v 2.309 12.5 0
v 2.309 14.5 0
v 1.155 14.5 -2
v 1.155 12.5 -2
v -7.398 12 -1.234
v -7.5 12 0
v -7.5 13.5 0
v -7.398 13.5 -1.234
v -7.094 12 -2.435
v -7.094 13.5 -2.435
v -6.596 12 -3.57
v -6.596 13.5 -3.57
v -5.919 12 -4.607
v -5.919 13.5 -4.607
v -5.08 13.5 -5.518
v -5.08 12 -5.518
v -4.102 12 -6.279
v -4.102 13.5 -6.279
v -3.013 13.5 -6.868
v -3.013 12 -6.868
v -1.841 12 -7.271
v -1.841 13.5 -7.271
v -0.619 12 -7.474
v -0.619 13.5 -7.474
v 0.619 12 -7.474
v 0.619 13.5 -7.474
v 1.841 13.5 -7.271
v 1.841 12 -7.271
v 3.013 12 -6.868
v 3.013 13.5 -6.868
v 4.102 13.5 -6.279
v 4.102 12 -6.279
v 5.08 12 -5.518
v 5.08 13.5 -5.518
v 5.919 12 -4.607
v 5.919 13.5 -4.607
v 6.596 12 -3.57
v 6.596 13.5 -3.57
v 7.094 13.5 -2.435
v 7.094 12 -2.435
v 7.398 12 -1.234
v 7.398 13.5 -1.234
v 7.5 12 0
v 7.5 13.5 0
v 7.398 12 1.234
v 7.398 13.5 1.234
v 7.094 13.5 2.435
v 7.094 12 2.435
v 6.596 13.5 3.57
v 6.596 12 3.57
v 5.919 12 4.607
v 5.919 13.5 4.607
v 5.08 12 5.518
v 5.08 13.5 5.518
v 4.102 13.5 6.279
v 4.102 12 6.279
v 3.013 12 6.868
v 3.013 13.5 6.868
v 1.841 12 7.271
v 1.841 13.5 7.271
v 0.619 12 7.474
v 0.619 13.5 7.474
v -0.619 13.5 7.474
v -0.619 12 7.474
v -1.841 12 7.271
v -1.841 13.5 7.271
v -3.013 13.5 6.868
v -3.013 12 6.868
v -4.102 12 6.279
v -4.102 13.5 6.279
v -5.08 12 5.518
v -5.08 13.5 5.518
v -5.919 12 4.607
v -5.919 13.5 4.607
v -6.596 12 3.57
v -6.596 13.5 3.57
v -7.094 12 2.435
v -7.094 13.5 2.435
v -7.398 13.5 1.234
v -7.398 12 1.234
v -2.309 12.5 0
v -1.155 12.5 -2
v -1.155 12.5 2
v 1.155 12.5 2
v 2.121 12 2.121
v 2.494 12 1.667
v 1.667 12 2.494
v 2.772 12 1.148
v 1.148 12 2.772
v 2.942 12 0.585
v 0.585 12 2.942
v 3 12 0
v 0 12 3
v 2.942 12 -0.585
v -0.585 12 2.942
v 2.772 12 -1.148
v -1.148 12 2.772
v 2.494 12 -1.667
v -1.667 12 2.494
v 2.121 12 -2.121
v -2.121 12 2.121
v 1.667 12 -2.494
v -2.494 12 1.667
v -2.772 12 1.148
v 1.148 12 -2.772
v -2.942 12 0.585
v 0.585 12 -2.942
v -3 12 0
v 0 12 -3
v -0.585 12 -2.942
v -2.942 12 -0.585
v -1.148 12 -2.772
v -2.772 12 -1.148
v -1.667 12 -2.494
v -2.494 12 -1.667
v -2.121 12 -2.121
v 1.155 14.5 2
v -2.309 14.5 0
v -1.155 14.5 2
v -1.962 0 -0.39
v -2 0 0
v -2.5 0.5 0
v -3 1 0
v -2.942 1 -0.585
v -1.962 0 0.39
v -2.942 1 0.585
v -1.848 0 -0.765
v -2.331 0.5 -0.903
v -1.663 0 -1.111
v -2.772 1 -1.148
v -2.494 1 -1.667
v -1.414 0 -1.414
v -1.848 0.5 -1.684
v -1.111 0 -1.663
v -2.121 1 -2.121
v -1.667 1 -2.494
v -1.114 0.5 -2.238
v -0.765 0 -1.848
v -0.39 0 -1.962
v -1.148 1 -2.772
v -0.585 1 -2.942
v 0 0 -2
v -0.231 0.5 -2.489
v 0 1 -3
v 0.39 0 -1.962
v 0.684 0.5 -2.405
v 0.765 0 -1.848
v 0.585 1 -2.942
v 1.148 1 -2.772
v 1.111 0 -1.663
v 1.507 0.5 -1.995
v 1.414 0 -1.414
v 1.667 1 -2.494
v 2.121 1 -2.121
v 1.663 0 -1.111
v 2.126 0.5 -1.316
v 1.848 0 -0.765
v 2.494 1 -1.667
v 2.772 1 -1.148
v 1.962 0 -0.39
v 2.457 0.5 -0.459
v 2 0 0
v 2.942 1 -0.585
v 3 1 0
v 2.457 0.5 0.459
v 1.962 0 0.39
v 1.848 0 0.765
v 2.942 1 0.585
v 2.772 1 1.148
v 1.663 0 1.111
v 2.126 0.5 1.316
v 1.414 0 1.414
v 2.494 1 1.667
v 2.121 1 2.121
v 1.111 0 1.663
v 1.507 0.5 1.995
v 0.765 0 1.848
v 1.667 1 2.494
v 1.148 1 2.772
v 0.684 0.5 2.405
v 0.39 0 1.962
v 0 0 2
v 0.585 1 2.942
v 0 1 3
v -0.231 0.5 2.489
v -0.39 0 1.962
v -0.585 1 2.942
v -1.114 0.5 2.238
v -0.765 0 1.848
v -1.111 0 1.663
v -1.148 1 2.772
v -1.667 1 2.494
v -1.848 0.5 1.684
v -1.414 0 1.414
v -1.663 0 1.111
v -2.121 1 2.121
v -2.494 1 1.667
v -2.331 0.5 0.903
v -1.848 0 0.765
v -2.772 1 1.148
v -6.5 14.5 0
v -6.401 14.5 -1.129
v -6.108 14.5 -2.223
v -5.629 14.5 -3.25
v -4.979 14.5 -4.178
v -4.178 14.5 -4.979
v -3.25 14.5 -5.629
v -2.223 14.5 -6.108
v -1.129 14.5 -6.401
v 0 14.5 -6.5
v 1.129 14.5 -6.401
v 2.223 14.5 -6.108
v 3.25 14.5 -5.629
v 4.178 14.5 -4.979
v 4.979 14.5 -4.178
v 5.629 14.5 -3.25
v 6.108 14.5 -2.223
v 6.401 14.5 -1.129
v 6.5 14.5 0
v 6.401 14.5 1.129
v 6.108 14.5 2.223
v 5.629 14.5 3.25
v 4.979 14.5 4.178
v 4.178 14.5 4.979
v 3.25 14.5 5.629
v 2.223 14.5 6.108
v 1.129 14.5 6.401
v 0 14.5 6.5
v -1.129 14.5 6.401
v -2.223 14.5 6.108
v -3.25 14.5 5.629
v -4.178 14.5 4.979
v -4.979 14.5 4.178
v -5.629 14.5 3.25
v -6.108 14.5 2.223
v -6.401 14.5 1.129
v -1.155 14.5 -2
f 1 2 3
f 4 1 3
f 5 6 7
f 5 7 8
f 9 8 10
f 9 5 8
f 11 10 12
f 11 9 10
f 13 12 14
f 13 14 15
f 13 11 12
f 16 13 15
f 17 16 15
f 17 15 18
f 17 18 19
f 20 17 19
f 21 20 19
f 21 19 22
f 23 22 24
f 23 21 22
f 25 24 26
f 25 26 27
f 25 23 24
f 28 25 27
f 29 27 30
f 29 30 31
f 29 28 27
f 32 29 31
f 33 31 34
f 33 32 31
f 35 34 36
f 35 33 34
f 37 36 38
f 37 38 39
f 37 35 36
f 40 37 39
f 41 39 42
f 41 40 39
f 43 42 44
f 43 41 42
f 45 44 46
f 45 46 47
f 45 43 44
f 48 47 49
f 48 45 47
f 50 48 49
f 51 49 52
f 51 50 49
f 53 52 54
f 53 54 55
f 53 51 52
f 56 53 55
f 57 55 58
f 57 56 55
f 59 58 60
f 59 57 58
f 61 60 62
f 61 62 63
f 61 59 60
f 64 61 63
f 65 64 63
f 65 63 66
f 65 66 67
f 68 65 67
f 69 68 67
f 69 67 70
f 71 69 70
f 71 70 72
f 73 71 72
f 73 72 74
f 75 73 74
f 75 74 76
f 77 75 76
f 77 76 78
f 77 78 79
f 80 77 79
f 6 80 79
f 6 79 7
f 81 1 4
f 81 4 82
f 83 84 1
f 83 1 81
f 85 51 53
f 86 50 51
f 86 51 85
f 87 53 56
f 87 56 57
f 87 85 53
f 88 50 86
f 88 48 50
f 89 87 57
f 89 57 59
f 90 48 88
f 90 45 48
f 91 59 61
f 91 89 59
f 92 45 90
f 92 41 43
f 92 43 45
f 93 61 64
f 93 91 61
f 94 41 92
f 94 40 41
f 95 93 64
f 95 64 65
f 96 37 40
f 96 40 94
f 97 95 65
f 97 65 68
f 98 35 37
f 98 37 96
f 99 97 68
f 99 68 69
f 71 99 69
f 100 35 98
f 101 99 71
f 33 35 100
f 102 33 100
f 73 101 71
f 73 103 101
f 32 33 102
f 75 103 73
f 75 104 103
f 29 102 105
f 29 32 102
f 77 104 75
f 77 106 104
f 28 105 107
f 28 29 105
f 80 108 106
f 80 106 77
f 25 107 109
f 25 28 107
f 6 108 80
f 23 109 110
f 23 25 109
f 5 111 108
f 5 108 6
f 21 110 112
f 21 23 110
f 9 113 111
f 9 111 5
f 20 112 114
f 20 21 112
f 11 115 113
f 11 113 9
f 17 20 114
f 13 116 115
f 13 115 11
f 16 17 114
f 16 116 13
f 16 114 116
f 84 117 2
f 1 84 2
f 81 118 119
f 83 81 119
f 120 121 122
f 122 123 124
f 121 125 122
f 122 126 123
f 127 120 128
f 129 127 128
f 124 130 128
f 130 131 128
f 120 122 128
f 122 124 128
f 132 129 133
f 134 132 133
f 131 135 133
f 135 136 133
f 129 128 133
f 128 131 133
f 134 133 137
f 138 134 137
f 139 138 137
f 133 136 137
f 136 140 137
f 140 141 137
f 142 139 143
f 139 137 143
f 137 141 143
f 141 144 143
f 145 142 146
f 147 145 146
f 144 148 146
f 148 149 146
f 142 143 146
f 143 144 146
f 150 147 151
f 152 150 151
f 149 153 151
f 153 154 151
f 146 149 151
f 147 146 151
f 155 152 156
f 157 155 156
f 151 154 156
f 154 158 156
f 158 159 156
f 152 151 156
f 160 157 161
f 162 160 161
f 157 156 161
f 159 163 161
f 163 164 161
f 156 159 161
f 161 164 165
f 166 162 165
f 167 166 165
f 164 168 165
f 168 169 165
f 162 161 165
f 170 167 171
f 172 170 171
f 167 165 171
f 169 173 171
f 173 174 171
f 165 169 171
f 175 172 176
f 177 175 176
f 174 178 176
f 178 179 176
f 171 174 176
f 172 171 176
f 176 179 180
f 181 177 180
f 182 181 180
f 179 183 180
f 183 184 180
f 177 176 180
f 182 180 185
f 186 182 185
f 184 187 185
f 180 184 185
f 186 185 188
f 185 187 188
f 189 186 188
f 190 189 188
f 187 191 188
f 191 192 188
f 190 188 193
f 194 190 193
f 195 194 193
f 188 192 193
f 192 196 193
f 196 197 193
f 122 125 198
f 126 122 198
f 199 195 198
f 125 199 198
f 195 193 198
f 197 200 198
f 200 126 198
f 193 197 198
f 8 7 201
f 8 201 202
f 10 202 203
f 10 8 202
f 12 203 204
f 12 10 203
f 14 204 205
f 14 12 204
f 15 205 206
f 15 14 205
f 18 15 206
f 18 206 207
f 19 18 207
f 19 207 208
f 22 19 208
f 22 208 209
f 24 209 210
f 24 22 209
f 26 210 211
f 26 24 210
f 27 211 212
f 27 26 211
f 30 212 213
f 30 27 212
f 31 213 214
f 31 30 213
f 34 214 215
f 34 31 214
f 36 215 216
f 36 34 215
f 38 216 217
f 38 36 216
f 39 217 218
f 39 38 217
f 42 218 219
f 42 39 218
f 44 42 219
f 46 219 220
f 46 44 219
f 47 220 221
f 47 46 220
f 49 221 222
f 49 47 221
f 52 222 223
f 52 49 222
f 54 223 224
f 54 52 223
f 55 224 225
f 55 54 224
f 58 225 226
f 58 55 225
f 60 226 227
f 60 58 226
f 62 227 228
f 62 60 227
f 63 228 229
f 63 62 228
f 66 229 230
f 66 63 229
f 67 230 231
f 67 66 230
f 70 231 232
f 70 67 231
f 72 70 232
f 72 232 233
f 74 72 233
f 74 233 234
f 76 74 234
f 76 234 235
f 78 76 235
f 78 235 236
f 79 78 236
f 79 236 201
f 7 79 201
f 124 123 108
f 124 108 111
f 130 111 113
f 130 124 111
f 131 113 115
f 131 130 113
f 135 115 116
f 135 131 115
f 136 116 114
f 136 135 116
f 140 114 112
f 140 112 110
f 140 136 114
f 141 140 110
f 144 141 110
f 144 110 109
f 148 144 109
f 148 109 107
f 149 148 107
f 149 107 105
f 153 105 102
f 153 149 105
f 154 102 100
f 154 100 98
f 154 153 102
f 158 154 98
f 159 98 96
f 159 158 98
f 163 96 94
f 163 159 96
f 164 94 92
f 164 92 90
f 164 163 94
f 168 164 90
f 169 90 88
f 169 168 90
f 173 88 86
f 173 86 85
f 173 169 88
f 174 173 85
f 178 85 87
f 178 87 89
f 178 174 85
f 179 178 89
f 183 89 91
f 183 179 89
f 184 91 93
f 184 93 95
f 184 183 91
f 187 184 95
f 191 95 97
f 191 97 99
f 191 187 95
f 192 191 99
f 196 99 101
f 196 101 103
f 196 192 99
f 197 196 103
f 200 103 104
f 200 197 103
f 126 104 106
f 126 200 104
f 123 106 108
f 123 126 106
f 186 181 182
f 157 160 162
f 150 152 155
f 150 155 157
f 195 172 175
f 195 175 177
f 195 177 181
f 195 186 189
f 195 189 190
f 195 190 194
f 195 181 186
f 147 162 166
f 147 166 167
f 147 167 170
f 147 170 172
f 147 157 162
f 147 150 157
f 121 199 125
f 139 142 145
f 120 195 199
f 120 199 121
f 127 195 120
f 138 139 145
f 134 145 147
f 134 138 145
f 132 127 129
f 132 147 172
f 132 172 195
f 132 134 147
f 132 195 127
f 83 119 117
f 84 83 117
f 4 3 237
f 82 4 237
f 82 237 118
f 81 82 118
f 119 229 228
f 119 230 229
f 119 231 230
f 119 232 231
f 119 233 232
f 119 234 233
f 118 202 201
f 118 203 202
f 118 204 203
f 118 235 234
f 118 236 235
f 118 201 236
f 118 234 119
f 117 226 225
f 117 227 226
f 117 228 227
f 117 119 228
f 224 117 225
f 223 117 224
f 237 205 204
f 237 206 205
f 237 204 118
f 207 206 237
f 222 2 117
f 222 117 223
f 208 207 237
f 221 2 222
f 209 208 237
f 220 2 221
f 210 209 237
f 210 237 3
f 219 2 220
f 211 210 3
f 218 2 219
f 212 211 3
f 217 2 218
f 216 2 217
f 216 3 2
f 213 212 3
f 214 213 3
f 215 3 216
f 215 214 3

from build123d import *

# Parameters (mm, degrees)
F2_SIZE  = 1
F4_DEPTH = 2


with BuildPart() as f1:
    # F0 (on Top) → F1 (revolve)
    with BuildSketch(Plane.XY):
        Polygon((-3, 0), (0, 0), (0, 14.5), (-7.5, 14.5), (-7.5, 12), (-3, 12), align=None)
    revolve(axis=Axis((0, 7.25, 0), (0, -1, 0)))

    # F2
    f2_edges = [f1.edges().sort_by_distance(p)[0] for p in [
        (7.5, 14.5, 0),
        (3, 0, 0),
    ]]
    chamfer(f2_edges, length=F2_SIZE)

    # F3 (on face) → F4 (cut)
    with BuildSketch(Plane(origin=(0, 14.5, 0), x_dir=(-1, 0, 0), z_dir=(0, 1, 0))):
        Polygon((1.154701, 2), (-1.154701, 2), (-2.309401, 0), (-1.154701, -2), (1.154701, -2), (2.309401, 0), align=None)
    extrude(amount=-F4_DEPTH, mode=Mode.SUBTRACT)


solid = f1.part
